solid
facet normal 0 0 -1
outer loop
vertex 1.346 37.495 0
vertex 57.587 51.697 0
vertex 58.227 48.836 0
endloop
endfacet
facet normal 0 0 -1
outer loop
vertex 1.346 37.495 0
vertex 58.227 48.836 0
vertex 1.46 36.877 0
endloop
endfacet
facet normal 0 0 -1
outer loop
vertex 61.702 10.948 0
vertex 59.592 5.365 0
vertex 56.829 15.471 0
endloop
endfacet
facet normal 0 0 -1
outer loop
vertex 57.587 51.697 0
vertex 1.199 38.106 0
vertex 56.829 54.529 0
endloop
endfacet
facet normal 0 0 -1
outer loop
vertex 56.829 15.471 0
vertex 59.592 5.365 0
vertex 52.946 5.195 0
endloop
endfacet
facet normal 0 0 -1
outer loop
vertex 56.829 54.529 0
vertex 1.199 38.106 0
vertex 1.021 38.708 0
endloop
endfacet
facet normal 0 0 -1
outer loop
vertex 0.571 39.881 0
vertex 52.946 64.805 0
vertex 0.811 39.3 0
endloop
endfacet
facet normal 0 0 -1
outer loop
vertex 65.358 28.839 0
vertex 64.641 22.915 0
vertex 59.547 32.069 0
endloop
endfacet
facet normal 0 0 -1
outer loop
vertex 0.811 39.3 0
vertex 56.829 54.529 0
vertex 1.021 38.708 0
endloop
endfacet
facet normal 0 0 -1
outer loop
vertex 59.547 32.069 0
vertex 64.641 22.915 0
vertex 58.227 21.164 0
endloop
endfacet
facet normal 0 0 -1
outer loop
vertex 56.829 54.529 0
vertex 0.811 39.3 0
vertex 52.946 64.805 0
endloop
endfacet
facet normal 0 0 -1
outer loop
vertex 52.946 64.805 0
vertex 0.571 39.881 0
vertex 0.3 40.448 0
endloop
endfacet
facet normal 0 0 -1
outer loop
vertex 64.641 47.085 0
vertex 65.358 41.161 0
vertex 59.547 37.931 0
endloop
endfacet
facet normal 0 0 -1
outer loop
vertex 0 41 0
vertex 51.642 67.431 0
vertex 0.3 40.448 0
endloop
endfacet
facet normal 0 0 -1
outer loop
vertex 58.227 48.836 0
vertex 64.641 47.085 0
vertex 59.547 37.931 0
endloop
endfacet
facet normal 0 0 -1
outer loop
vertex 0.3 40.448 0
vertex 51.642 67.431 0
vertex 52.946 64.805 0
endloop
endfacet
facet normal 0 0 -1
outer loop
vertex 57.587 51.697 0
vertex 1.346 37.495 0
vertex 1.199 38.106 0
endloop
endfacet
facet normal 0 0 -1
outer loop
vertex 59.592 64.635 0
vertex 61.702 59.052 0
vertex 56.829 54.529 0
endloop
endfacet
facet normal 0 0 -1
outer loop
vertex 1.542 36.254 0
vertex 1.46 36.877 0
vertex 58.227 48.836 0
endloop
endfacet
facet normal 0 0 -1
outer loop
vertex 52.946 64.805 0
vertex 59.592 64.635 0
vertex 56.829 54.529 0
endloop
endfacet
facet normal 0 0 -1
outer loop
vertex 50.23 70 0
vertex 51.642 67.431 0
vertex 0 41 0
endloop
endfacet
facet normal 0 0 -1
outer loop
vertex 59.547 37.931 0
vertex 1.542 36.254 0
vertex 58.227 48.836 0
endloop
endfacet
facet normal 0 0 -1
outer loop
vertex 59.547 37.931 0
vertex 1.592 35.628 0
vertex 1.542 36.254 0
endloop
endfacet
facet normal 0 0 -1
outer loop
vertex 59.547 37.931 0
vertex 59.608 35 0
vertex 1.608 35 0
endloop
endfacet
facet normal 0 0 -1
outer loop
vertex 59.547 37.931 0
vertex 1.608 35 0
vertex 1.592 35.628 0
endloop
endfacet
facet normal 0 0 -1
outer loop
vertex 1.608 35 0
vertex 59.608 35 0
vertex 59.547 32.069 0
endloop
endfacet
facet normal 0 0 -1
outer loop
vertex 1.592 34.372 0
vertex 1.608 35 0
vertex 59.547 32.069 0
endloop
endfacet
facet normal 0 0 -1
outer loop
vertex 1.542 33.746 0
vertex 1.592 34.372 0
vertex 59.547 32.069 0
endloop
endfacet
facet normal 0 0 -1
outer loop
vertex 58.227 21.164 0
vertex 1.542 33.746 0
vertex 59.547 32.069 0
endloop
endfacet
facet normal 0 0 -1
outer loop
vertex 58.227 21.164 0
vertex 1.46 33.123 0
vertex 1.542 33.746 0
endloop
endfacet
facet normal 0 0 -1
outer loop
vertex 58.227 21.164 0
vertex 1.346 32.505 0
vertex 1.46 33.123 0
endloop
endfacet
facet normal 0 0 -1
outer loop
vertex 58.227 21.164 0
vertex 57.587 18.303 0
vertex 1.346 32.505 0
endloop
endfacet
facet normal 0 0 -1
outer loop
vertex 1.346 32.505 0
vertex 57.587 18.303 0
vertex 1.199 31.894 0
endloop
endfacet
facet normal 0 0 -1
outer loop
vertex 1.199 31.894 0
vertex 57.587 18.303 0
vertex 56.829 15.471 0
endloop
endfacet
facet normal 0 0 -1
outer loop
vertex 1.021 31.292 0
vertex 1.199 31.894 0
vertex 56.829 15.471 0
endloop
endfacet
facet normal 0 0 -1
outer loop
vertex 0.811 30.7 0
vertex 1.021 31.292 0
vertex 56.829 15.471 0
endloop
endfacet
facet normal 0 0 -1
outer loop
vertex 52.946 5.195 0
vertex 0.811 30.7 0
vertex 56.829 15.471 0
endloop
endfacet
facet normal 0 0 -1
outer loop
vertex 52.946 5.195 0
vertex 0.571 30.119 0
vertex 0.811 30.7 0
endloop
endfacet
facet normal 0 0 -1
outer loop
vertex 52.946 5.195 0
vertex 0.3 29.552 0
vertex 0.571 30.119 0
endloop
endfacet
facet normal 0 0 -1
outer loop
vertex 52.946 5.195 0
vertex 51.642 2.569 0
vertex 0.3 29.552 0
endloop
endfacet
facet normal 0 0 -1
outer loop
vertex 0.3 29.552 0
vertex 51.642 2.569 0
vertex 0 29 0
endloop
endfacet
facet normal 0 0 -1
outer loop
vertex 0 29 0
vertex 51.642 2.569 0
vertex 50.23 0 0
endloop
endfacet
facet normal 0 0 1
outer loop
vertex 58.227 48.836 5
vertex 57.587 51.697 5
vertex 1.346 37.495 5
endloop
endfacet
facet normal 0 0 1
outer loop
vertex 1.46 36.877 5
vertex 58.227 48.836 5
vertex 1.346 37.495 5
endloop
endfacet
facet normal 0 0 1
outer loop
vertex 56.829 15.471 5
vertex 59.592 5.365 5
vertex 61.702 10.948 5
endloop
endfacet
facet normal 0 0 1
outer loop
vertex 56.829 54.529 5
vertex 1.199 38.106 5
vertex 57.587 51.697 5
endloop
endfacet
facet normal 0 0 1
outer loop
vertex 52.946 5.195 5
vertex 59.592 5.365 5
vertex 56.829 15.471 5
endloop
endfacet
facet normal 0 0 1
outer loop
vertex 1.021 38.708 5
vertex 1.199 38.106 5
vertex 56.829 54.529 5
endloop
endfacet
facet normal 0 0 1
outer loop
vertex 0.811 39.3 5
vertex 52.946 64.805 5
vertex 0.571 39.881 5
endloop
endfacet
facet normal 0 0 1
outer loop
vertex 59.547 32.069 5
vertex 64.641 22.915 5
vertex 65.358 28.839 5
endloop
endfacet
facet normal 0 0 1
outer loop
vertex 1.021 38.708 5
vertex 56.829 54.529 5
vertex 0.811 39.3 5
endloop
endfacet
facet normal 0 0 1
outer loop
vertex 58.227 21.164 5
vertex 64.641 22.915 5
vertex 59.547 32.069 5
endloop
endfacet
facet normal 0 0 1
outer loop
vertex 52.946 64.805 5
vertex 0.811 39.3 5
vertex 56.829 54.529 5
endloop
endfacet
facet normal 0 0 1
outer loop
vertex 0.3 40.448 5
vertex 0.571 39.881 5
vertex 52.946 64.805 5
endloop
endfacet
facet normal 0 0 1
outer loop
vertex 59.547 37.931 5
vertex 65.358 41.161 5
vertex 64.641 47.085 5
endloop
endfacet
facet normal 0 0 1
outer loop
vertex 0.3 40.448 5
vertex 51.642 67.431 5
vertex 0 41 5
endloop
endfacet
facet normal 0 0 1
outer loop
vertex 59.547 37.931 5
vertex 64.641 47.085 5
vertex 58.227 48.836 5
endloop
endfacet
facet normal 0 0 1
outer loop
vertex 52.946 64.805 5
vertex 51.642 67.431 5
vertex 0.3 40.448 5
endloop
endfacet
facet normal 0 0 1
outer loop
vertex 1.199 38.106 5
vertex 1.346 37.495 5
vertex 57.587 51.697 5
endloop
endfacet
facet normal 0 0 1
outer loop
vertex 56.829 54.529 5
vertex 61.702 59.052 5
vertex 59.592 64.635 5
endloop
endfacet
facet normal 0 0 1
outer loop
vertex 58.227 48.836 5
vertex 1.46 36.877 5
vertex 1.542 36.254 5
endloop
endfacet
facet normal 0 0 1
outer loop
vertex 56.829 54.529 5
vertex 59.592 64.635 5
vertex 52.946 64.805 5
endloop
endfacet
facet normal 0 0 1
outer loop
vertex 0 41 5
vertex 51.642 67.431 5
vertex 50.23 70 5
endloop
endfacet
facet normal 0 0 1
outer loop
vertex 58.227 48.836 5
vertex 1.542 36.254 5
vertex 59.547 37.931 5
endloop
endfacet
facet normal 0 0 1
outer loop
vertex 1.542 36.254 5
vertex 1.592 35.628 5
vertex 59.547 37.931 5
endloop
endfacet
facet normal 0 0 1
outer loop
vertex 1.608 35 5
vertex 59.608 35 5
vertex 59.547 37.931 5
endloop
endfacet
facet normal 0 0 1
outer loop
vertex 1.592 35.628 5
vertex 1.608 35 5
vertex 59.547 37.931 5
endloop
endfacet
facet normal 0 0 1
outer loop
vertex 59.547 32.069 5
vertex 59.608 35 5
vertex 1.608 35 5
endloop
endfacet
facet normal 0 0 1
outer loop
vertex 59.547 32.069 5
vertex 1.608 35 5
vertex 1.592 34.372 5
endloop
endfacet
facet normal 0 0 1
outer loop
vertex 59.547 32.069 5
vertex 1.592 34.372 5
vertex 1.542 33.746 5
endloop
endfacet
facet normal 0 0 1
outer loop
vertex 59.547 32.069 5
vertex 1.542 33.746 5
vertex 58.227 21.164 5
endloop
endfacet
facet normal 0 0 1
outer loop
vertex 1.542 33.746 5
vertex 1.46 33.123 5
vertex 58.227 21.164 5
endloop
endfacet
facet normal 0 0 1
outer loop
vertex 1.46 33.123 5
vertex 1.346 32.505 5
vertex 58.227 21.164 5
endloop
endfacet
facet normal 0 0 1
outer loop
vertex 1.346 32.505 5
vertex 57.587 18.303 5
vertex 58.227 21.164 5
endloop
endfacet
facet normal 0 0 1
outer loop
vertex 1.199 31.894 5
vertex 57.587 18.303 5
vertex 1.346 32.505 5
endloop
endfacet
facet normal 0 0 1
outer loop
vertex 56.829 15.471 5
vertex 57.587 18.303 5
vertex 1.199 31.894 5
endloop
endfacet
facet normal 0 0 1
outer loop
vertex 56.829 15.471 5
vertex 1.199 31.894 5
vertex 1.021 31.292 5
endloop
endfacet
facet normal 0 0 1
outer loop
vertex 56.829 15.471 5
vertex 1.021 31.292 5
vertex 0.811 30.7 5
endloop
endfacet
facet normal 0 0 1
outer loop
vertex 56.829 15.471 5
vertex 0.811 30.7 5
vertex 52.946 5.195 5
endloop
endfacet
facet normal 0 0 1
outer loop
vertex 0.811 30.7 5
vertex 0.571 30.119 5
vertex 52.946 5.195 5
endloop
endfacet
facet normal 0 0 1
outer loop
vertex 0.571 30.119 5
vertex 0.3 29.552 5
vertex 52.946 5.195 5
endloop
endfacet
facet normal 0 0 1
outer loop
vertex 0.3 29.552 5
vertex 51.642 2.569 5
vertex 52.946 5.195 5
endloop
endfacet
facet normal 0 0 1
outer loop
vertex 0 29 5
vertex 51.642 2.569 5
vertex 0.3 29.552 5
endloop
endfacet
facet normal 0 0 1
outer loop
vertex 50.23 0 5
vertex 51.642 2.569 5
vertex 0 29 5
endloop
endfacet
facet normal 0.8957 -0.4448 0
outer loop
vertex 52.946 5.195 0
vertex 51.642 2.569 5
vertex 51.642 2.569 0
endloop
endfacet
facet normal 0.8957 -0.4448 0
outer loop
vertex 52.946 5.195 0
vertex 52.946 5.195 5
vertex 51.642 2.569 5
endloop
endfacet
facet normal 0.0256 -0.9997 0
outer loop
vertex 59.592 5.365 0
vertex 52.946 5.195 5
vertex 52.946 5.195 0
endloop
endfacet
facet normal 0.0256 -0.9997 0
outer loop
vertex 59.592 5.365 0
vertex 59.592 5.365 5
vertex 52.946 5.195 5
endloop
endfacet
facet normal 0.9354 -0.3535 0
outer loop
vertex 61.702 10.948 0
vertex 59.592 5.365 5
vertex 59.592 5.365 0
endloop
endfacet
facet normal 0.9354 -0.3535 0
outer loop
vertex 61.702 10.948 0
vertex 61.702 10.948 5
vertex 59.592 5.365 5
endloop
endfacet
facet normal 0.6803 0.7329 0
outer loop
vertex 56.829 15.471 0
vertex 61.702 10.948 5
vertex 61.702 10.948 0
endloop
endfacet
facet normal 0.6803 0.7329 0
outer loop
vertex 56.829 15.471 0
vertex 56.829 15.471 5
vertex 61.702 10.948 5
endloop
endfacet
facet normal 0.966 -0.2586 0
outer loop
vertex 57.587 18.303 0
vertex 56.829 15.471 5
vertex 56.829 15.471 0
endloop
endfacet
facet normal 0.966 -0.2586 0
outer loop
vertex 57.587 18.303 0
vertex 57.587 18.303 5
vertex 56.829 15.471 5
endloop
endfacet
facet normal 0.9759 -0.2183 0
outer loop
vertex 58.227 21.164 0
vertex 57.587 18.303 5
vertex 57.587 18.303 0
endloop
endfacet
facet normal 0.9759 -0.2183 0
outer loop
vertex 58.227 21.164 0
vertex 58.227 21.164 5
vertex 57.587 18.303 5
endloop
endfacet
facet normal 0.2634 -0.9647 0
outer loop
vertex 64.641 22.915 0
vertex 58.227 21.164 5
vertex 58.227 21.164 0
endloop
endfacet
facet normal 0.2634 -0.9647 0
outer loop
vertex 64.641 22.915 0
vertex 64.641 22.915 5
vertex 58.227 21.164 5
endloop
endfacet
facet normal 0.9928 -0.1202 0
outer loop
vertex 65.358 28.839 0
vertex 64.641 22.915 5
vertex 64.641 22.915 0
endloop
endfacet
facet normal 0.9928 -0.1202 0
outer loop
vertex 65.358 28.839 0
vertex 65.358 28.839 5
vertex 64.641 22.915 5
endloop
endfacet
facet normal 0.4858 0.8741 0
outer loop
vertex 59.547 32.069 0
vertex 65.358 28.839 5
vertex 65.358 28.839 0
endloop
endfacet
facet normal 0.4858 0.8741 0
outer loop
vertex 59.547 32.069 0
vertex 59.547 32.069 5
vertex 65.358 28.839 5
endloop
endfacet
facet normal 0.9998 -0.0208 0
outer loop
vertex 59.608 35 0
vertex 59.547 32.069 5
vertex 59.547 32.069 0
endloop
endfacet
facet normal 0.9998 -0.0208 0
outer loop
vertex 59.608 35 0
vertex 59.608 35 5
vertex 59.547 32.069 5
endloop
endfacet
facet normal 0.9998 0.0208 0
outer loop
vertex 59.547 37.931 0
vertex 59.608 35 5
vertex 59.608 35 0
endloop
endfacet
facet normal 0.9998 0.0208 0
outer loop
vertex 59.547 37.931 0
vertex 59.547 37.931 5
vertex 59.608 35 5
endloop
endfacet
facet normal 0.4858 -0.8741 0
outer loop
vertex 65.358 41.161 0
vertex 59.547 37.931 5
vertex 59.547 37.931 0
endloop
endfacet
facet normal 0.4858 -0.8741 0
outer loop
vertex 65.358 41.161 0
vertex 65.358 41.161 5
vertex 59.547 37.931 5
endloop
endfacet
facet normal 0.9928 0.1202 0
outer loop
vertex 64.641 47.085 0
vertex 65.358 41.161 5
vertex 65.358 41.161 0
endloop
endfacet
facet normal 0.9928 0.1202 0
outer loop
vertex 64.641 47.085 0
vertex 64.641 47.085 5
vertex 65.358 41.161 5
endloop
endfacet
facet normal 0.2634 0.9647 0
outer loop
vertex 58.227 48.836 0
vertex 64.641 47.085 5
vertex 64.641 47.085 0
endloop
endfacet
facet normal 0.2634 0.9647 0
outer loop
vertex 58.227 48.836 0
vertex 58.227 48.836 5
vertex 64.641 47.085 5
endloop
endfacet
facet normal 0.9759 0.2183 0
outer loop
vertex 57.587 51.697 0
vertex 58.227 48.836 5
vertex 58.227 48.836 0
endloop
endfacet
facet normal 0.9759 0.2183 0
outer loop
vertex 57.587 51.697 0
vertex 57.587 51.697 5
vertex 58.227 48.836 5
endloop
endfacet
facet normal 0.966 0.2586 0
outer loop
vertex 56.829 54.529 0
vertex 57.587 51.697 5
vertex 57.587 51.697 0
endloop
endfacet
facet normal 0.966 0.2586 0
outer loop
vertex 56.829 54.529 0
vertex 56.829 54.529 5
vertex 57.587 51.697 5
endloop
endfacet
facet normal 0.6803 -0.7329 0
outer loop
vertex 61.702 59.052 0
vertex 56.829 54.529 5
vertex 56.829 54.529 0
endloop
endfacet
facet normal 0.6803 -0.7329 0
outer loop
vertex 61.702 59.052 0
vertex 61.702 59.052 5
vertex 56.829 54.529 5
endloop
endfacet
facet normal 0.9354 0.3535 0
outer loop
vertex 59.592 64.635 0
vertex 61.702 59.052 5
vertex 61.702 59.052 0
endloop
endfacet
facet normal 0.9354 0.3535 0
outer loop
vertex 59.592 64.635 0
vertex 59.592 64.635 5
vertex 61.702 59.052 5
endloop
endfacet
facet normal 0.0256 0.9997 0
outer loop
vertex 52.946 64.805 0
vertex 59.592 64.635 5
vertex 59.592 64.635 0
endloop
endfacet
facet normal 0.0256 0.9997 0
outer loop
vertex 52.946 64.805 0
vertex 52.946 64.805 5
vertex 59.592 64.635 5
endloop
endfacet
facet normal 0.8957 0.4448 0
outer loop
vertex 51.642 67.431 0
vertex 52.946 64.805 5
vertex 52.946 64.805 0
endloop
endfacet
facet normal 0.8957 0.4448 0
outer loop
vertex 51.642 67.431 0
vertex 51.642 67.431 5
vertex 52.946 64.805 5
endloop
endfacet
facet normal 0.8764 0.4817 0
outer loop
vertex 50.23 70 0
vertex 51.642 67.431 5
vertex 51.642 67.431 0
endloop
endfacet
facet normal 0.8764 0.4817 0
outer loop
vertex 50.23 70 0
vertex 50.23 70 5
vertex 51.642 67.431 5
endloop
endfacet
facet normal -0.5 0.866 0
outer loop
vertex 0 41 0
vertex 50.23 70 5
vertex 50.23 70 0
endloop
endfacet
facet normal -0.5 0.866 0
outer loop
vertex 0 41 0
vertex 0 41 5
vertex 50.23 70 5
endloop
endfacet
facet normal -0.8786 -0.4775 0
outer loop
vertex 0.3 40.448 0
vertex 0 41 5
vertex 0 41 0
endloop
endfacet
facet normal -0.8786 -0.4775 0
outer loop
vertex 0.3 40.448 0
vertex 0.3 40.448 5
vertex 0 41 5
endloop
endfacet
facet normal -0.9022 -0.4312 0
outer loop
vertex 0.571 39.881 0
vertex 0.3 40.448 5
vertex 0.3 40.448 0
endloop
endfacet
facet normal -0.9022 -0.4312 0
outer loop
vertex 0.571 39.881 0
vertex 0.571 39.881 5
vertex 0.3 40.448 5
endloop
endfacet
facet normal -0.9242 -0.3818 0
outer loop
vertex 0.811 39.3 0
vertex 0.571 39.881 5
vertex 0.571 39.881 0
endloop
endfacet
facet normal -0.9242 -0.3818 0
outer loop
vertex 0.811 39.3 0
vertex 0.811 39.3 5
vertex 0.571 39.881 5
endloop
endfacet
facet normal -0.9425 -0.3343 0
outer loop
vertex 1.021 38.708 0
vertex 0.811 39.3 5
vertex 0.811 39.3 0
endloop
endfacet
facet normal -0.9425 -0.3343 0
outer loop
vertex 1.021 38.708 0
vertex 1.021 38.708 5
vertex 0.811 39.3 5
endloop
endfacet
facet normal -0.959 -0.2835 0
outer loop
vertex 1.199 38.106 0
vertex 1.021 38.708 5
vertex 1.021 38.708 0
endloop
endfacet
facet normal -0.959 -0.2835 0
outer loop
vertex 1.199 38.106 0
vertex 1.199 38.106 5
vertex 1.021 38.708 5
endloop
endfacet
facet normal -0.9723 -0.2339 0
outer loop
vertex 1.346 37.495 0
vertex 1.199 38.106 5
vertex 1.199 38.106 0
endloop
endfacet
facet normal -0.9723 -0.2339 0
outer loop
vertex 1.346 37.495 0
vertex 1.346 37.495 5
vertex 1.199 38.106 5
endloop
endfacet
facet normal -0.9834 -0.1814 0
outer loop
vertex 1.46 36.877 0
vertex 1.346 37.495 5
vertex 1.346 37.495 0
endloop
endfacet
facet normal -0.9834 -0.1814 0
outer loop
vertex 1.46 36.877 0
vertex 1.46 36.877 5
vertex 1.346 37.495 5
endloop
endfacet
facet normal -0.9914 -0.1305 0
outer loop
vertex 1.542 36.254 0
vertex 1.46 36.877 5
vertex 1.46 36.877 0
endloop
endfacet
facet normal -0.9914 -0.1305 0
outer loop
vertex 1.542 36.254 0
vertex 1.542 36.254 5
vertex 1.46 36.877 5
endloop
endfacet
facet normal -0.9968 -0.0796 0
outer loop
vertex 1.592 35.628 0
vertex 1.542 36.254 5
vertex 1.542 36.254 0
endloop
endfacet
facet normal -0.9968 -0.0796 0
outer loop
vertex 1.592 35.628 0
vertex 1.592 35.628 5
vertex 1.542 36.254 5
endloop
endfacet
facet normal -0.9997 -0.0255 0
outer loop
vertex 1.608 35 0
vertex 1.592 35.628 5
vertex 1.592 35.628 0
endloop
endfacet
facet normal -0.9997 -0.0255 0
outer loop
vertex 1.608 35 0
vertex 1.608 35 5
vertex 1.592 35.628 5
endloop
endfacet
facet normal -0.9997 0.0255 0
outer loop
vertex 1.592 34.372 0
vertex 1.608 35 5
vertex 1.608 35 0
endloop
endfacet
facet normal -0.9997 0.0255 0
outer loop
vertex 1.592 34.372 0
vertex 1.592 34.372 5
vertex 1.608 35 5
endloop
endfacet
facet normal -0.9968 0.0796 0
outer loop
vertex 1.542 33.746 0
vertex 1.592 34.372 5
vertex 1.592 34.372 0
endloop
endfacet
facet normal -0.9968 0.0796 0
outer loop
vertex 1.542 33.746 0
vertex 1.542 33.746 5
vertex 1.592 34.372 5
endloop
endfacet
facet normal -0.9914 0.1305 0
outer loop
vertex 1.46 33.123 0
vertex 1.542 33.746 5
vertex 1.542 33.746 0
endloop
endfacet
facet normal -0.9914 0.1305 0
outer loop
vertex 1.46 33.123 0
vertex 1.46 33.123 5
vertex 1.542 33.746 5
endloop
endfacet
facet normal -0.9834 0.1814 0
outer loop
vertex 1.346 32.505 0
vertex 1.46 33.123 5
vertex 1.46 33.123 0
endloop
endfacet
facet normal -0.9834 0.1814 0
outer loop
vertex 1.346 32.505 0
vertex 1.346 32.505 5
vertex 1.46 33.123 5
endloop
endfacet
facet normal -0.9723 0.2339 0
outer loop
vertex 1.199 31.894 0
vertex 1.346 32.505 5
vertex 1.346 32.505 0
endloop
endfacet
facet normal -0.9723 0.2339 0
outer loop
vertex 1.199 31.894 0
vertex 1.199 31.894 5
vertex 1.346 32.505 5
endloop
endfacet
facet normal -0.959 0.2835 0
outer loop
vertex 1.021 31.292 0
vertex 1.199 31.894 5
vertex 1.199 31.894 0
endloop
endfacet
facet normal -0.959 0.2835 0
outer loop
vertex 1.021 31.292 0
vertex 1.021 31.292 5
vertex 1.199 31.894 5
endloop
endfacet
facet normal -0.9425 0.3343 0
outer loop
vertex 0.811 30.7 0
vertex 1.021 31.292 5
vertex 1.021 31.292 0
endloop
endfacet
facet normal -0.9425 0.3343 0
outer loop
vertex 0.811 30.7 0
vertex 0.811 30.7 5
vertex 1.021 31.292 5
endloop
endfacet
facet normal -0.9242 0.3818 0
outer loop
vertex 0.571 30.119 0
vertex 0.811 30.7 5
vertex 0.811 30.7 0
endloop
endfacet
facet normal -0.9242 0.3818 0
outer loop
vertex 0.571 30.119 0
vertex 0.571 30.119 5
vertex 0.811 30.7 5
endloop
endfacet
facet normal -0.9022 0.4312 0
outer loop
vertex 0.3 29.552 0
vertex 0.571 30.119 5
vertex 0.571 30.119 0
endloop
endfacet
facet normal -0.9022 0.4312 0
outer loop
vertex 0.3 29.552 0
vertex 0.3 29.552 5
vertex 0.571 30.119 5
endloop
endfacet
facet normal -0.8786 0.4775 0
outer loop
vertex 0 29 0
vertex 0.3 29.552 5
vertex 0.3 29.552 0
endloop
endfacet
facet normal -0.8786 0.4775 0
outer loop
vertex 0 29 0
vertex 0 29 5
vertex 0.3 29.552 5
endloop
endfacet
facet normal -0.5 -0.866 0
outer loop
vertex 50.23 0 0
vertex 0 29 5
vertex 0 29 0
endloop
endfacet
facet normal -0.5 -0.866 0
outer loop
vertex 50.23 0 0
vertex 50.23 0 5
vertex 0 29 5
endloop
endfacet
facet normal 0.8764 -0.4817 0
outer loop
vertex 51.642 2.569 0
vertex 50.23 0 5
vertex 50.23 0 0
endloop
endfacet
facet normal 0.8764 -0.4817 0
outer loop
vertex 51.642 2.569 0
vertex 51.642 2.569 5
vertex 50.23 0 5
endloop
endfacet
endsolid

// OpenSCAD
$fn = 32;

// ----------------------------------------------------------------------
// Gear sector: 4 teeth on 60 degrees
// ----------------------------------------------------------------------

// --- parameters (mm) ---
sector_angle = 60;        // sector angle, degrees
root_r = 70;              // root circle radius
tooth_h = 6;              // tooth height over the root circle
teeth = 4;                // number of teeth on the sector
hub_r = 12;               // hub bore radius
plate_t = 5;              // sector thickness, Z
arc_step = 3;             // sampling step of the root/hub arcs, degrees

tip_r = root_r + tooth_h;  // tip circle radius

profile = [[50.23, 0], [51.642, 2.569], [52.946, 5.195], [59.592, 5.365], [61.702, 10.948], [56.829, 15.471], [57.587, 18.303], [58.227, 21.164], [64.641, 22.915], [65.358, 28.839], [59.547, 32.069], [59.608, 35], [59.547, 37.931], [65.358, 41.161], [64.641, 47.085], [58.227, 48.836], [57.587, 51.697], [56.829, 54.529], [61.702, 59.052], [59.592, 64.635], [52.946, 64.805], [51.642, 67.431], [50.23, 70], [0, 41], [0.3, 40.448], [0.571, 39.881], [0.811, 39.3], [1.021, 38.708], [1.199, 38.106], [1.346, 37.495], [1.46, 36.877], [1.542, 36.254], [1.592, 35.628], [1.608, 35], [1.592, 34.372], [1.542, 33.746], [1.46, 33.123], [1.346, 32.505], [1.199, 31.894], [1.021, 31.292], [0.811, 30.7], [0.571, 30.119], [0.3, 29.552], [0, 29]];  // primary outline, 44 points, counter clockwise

// --- the one profile operation ---
linear_extrude(height = plate_t) polygon(points = profile);
